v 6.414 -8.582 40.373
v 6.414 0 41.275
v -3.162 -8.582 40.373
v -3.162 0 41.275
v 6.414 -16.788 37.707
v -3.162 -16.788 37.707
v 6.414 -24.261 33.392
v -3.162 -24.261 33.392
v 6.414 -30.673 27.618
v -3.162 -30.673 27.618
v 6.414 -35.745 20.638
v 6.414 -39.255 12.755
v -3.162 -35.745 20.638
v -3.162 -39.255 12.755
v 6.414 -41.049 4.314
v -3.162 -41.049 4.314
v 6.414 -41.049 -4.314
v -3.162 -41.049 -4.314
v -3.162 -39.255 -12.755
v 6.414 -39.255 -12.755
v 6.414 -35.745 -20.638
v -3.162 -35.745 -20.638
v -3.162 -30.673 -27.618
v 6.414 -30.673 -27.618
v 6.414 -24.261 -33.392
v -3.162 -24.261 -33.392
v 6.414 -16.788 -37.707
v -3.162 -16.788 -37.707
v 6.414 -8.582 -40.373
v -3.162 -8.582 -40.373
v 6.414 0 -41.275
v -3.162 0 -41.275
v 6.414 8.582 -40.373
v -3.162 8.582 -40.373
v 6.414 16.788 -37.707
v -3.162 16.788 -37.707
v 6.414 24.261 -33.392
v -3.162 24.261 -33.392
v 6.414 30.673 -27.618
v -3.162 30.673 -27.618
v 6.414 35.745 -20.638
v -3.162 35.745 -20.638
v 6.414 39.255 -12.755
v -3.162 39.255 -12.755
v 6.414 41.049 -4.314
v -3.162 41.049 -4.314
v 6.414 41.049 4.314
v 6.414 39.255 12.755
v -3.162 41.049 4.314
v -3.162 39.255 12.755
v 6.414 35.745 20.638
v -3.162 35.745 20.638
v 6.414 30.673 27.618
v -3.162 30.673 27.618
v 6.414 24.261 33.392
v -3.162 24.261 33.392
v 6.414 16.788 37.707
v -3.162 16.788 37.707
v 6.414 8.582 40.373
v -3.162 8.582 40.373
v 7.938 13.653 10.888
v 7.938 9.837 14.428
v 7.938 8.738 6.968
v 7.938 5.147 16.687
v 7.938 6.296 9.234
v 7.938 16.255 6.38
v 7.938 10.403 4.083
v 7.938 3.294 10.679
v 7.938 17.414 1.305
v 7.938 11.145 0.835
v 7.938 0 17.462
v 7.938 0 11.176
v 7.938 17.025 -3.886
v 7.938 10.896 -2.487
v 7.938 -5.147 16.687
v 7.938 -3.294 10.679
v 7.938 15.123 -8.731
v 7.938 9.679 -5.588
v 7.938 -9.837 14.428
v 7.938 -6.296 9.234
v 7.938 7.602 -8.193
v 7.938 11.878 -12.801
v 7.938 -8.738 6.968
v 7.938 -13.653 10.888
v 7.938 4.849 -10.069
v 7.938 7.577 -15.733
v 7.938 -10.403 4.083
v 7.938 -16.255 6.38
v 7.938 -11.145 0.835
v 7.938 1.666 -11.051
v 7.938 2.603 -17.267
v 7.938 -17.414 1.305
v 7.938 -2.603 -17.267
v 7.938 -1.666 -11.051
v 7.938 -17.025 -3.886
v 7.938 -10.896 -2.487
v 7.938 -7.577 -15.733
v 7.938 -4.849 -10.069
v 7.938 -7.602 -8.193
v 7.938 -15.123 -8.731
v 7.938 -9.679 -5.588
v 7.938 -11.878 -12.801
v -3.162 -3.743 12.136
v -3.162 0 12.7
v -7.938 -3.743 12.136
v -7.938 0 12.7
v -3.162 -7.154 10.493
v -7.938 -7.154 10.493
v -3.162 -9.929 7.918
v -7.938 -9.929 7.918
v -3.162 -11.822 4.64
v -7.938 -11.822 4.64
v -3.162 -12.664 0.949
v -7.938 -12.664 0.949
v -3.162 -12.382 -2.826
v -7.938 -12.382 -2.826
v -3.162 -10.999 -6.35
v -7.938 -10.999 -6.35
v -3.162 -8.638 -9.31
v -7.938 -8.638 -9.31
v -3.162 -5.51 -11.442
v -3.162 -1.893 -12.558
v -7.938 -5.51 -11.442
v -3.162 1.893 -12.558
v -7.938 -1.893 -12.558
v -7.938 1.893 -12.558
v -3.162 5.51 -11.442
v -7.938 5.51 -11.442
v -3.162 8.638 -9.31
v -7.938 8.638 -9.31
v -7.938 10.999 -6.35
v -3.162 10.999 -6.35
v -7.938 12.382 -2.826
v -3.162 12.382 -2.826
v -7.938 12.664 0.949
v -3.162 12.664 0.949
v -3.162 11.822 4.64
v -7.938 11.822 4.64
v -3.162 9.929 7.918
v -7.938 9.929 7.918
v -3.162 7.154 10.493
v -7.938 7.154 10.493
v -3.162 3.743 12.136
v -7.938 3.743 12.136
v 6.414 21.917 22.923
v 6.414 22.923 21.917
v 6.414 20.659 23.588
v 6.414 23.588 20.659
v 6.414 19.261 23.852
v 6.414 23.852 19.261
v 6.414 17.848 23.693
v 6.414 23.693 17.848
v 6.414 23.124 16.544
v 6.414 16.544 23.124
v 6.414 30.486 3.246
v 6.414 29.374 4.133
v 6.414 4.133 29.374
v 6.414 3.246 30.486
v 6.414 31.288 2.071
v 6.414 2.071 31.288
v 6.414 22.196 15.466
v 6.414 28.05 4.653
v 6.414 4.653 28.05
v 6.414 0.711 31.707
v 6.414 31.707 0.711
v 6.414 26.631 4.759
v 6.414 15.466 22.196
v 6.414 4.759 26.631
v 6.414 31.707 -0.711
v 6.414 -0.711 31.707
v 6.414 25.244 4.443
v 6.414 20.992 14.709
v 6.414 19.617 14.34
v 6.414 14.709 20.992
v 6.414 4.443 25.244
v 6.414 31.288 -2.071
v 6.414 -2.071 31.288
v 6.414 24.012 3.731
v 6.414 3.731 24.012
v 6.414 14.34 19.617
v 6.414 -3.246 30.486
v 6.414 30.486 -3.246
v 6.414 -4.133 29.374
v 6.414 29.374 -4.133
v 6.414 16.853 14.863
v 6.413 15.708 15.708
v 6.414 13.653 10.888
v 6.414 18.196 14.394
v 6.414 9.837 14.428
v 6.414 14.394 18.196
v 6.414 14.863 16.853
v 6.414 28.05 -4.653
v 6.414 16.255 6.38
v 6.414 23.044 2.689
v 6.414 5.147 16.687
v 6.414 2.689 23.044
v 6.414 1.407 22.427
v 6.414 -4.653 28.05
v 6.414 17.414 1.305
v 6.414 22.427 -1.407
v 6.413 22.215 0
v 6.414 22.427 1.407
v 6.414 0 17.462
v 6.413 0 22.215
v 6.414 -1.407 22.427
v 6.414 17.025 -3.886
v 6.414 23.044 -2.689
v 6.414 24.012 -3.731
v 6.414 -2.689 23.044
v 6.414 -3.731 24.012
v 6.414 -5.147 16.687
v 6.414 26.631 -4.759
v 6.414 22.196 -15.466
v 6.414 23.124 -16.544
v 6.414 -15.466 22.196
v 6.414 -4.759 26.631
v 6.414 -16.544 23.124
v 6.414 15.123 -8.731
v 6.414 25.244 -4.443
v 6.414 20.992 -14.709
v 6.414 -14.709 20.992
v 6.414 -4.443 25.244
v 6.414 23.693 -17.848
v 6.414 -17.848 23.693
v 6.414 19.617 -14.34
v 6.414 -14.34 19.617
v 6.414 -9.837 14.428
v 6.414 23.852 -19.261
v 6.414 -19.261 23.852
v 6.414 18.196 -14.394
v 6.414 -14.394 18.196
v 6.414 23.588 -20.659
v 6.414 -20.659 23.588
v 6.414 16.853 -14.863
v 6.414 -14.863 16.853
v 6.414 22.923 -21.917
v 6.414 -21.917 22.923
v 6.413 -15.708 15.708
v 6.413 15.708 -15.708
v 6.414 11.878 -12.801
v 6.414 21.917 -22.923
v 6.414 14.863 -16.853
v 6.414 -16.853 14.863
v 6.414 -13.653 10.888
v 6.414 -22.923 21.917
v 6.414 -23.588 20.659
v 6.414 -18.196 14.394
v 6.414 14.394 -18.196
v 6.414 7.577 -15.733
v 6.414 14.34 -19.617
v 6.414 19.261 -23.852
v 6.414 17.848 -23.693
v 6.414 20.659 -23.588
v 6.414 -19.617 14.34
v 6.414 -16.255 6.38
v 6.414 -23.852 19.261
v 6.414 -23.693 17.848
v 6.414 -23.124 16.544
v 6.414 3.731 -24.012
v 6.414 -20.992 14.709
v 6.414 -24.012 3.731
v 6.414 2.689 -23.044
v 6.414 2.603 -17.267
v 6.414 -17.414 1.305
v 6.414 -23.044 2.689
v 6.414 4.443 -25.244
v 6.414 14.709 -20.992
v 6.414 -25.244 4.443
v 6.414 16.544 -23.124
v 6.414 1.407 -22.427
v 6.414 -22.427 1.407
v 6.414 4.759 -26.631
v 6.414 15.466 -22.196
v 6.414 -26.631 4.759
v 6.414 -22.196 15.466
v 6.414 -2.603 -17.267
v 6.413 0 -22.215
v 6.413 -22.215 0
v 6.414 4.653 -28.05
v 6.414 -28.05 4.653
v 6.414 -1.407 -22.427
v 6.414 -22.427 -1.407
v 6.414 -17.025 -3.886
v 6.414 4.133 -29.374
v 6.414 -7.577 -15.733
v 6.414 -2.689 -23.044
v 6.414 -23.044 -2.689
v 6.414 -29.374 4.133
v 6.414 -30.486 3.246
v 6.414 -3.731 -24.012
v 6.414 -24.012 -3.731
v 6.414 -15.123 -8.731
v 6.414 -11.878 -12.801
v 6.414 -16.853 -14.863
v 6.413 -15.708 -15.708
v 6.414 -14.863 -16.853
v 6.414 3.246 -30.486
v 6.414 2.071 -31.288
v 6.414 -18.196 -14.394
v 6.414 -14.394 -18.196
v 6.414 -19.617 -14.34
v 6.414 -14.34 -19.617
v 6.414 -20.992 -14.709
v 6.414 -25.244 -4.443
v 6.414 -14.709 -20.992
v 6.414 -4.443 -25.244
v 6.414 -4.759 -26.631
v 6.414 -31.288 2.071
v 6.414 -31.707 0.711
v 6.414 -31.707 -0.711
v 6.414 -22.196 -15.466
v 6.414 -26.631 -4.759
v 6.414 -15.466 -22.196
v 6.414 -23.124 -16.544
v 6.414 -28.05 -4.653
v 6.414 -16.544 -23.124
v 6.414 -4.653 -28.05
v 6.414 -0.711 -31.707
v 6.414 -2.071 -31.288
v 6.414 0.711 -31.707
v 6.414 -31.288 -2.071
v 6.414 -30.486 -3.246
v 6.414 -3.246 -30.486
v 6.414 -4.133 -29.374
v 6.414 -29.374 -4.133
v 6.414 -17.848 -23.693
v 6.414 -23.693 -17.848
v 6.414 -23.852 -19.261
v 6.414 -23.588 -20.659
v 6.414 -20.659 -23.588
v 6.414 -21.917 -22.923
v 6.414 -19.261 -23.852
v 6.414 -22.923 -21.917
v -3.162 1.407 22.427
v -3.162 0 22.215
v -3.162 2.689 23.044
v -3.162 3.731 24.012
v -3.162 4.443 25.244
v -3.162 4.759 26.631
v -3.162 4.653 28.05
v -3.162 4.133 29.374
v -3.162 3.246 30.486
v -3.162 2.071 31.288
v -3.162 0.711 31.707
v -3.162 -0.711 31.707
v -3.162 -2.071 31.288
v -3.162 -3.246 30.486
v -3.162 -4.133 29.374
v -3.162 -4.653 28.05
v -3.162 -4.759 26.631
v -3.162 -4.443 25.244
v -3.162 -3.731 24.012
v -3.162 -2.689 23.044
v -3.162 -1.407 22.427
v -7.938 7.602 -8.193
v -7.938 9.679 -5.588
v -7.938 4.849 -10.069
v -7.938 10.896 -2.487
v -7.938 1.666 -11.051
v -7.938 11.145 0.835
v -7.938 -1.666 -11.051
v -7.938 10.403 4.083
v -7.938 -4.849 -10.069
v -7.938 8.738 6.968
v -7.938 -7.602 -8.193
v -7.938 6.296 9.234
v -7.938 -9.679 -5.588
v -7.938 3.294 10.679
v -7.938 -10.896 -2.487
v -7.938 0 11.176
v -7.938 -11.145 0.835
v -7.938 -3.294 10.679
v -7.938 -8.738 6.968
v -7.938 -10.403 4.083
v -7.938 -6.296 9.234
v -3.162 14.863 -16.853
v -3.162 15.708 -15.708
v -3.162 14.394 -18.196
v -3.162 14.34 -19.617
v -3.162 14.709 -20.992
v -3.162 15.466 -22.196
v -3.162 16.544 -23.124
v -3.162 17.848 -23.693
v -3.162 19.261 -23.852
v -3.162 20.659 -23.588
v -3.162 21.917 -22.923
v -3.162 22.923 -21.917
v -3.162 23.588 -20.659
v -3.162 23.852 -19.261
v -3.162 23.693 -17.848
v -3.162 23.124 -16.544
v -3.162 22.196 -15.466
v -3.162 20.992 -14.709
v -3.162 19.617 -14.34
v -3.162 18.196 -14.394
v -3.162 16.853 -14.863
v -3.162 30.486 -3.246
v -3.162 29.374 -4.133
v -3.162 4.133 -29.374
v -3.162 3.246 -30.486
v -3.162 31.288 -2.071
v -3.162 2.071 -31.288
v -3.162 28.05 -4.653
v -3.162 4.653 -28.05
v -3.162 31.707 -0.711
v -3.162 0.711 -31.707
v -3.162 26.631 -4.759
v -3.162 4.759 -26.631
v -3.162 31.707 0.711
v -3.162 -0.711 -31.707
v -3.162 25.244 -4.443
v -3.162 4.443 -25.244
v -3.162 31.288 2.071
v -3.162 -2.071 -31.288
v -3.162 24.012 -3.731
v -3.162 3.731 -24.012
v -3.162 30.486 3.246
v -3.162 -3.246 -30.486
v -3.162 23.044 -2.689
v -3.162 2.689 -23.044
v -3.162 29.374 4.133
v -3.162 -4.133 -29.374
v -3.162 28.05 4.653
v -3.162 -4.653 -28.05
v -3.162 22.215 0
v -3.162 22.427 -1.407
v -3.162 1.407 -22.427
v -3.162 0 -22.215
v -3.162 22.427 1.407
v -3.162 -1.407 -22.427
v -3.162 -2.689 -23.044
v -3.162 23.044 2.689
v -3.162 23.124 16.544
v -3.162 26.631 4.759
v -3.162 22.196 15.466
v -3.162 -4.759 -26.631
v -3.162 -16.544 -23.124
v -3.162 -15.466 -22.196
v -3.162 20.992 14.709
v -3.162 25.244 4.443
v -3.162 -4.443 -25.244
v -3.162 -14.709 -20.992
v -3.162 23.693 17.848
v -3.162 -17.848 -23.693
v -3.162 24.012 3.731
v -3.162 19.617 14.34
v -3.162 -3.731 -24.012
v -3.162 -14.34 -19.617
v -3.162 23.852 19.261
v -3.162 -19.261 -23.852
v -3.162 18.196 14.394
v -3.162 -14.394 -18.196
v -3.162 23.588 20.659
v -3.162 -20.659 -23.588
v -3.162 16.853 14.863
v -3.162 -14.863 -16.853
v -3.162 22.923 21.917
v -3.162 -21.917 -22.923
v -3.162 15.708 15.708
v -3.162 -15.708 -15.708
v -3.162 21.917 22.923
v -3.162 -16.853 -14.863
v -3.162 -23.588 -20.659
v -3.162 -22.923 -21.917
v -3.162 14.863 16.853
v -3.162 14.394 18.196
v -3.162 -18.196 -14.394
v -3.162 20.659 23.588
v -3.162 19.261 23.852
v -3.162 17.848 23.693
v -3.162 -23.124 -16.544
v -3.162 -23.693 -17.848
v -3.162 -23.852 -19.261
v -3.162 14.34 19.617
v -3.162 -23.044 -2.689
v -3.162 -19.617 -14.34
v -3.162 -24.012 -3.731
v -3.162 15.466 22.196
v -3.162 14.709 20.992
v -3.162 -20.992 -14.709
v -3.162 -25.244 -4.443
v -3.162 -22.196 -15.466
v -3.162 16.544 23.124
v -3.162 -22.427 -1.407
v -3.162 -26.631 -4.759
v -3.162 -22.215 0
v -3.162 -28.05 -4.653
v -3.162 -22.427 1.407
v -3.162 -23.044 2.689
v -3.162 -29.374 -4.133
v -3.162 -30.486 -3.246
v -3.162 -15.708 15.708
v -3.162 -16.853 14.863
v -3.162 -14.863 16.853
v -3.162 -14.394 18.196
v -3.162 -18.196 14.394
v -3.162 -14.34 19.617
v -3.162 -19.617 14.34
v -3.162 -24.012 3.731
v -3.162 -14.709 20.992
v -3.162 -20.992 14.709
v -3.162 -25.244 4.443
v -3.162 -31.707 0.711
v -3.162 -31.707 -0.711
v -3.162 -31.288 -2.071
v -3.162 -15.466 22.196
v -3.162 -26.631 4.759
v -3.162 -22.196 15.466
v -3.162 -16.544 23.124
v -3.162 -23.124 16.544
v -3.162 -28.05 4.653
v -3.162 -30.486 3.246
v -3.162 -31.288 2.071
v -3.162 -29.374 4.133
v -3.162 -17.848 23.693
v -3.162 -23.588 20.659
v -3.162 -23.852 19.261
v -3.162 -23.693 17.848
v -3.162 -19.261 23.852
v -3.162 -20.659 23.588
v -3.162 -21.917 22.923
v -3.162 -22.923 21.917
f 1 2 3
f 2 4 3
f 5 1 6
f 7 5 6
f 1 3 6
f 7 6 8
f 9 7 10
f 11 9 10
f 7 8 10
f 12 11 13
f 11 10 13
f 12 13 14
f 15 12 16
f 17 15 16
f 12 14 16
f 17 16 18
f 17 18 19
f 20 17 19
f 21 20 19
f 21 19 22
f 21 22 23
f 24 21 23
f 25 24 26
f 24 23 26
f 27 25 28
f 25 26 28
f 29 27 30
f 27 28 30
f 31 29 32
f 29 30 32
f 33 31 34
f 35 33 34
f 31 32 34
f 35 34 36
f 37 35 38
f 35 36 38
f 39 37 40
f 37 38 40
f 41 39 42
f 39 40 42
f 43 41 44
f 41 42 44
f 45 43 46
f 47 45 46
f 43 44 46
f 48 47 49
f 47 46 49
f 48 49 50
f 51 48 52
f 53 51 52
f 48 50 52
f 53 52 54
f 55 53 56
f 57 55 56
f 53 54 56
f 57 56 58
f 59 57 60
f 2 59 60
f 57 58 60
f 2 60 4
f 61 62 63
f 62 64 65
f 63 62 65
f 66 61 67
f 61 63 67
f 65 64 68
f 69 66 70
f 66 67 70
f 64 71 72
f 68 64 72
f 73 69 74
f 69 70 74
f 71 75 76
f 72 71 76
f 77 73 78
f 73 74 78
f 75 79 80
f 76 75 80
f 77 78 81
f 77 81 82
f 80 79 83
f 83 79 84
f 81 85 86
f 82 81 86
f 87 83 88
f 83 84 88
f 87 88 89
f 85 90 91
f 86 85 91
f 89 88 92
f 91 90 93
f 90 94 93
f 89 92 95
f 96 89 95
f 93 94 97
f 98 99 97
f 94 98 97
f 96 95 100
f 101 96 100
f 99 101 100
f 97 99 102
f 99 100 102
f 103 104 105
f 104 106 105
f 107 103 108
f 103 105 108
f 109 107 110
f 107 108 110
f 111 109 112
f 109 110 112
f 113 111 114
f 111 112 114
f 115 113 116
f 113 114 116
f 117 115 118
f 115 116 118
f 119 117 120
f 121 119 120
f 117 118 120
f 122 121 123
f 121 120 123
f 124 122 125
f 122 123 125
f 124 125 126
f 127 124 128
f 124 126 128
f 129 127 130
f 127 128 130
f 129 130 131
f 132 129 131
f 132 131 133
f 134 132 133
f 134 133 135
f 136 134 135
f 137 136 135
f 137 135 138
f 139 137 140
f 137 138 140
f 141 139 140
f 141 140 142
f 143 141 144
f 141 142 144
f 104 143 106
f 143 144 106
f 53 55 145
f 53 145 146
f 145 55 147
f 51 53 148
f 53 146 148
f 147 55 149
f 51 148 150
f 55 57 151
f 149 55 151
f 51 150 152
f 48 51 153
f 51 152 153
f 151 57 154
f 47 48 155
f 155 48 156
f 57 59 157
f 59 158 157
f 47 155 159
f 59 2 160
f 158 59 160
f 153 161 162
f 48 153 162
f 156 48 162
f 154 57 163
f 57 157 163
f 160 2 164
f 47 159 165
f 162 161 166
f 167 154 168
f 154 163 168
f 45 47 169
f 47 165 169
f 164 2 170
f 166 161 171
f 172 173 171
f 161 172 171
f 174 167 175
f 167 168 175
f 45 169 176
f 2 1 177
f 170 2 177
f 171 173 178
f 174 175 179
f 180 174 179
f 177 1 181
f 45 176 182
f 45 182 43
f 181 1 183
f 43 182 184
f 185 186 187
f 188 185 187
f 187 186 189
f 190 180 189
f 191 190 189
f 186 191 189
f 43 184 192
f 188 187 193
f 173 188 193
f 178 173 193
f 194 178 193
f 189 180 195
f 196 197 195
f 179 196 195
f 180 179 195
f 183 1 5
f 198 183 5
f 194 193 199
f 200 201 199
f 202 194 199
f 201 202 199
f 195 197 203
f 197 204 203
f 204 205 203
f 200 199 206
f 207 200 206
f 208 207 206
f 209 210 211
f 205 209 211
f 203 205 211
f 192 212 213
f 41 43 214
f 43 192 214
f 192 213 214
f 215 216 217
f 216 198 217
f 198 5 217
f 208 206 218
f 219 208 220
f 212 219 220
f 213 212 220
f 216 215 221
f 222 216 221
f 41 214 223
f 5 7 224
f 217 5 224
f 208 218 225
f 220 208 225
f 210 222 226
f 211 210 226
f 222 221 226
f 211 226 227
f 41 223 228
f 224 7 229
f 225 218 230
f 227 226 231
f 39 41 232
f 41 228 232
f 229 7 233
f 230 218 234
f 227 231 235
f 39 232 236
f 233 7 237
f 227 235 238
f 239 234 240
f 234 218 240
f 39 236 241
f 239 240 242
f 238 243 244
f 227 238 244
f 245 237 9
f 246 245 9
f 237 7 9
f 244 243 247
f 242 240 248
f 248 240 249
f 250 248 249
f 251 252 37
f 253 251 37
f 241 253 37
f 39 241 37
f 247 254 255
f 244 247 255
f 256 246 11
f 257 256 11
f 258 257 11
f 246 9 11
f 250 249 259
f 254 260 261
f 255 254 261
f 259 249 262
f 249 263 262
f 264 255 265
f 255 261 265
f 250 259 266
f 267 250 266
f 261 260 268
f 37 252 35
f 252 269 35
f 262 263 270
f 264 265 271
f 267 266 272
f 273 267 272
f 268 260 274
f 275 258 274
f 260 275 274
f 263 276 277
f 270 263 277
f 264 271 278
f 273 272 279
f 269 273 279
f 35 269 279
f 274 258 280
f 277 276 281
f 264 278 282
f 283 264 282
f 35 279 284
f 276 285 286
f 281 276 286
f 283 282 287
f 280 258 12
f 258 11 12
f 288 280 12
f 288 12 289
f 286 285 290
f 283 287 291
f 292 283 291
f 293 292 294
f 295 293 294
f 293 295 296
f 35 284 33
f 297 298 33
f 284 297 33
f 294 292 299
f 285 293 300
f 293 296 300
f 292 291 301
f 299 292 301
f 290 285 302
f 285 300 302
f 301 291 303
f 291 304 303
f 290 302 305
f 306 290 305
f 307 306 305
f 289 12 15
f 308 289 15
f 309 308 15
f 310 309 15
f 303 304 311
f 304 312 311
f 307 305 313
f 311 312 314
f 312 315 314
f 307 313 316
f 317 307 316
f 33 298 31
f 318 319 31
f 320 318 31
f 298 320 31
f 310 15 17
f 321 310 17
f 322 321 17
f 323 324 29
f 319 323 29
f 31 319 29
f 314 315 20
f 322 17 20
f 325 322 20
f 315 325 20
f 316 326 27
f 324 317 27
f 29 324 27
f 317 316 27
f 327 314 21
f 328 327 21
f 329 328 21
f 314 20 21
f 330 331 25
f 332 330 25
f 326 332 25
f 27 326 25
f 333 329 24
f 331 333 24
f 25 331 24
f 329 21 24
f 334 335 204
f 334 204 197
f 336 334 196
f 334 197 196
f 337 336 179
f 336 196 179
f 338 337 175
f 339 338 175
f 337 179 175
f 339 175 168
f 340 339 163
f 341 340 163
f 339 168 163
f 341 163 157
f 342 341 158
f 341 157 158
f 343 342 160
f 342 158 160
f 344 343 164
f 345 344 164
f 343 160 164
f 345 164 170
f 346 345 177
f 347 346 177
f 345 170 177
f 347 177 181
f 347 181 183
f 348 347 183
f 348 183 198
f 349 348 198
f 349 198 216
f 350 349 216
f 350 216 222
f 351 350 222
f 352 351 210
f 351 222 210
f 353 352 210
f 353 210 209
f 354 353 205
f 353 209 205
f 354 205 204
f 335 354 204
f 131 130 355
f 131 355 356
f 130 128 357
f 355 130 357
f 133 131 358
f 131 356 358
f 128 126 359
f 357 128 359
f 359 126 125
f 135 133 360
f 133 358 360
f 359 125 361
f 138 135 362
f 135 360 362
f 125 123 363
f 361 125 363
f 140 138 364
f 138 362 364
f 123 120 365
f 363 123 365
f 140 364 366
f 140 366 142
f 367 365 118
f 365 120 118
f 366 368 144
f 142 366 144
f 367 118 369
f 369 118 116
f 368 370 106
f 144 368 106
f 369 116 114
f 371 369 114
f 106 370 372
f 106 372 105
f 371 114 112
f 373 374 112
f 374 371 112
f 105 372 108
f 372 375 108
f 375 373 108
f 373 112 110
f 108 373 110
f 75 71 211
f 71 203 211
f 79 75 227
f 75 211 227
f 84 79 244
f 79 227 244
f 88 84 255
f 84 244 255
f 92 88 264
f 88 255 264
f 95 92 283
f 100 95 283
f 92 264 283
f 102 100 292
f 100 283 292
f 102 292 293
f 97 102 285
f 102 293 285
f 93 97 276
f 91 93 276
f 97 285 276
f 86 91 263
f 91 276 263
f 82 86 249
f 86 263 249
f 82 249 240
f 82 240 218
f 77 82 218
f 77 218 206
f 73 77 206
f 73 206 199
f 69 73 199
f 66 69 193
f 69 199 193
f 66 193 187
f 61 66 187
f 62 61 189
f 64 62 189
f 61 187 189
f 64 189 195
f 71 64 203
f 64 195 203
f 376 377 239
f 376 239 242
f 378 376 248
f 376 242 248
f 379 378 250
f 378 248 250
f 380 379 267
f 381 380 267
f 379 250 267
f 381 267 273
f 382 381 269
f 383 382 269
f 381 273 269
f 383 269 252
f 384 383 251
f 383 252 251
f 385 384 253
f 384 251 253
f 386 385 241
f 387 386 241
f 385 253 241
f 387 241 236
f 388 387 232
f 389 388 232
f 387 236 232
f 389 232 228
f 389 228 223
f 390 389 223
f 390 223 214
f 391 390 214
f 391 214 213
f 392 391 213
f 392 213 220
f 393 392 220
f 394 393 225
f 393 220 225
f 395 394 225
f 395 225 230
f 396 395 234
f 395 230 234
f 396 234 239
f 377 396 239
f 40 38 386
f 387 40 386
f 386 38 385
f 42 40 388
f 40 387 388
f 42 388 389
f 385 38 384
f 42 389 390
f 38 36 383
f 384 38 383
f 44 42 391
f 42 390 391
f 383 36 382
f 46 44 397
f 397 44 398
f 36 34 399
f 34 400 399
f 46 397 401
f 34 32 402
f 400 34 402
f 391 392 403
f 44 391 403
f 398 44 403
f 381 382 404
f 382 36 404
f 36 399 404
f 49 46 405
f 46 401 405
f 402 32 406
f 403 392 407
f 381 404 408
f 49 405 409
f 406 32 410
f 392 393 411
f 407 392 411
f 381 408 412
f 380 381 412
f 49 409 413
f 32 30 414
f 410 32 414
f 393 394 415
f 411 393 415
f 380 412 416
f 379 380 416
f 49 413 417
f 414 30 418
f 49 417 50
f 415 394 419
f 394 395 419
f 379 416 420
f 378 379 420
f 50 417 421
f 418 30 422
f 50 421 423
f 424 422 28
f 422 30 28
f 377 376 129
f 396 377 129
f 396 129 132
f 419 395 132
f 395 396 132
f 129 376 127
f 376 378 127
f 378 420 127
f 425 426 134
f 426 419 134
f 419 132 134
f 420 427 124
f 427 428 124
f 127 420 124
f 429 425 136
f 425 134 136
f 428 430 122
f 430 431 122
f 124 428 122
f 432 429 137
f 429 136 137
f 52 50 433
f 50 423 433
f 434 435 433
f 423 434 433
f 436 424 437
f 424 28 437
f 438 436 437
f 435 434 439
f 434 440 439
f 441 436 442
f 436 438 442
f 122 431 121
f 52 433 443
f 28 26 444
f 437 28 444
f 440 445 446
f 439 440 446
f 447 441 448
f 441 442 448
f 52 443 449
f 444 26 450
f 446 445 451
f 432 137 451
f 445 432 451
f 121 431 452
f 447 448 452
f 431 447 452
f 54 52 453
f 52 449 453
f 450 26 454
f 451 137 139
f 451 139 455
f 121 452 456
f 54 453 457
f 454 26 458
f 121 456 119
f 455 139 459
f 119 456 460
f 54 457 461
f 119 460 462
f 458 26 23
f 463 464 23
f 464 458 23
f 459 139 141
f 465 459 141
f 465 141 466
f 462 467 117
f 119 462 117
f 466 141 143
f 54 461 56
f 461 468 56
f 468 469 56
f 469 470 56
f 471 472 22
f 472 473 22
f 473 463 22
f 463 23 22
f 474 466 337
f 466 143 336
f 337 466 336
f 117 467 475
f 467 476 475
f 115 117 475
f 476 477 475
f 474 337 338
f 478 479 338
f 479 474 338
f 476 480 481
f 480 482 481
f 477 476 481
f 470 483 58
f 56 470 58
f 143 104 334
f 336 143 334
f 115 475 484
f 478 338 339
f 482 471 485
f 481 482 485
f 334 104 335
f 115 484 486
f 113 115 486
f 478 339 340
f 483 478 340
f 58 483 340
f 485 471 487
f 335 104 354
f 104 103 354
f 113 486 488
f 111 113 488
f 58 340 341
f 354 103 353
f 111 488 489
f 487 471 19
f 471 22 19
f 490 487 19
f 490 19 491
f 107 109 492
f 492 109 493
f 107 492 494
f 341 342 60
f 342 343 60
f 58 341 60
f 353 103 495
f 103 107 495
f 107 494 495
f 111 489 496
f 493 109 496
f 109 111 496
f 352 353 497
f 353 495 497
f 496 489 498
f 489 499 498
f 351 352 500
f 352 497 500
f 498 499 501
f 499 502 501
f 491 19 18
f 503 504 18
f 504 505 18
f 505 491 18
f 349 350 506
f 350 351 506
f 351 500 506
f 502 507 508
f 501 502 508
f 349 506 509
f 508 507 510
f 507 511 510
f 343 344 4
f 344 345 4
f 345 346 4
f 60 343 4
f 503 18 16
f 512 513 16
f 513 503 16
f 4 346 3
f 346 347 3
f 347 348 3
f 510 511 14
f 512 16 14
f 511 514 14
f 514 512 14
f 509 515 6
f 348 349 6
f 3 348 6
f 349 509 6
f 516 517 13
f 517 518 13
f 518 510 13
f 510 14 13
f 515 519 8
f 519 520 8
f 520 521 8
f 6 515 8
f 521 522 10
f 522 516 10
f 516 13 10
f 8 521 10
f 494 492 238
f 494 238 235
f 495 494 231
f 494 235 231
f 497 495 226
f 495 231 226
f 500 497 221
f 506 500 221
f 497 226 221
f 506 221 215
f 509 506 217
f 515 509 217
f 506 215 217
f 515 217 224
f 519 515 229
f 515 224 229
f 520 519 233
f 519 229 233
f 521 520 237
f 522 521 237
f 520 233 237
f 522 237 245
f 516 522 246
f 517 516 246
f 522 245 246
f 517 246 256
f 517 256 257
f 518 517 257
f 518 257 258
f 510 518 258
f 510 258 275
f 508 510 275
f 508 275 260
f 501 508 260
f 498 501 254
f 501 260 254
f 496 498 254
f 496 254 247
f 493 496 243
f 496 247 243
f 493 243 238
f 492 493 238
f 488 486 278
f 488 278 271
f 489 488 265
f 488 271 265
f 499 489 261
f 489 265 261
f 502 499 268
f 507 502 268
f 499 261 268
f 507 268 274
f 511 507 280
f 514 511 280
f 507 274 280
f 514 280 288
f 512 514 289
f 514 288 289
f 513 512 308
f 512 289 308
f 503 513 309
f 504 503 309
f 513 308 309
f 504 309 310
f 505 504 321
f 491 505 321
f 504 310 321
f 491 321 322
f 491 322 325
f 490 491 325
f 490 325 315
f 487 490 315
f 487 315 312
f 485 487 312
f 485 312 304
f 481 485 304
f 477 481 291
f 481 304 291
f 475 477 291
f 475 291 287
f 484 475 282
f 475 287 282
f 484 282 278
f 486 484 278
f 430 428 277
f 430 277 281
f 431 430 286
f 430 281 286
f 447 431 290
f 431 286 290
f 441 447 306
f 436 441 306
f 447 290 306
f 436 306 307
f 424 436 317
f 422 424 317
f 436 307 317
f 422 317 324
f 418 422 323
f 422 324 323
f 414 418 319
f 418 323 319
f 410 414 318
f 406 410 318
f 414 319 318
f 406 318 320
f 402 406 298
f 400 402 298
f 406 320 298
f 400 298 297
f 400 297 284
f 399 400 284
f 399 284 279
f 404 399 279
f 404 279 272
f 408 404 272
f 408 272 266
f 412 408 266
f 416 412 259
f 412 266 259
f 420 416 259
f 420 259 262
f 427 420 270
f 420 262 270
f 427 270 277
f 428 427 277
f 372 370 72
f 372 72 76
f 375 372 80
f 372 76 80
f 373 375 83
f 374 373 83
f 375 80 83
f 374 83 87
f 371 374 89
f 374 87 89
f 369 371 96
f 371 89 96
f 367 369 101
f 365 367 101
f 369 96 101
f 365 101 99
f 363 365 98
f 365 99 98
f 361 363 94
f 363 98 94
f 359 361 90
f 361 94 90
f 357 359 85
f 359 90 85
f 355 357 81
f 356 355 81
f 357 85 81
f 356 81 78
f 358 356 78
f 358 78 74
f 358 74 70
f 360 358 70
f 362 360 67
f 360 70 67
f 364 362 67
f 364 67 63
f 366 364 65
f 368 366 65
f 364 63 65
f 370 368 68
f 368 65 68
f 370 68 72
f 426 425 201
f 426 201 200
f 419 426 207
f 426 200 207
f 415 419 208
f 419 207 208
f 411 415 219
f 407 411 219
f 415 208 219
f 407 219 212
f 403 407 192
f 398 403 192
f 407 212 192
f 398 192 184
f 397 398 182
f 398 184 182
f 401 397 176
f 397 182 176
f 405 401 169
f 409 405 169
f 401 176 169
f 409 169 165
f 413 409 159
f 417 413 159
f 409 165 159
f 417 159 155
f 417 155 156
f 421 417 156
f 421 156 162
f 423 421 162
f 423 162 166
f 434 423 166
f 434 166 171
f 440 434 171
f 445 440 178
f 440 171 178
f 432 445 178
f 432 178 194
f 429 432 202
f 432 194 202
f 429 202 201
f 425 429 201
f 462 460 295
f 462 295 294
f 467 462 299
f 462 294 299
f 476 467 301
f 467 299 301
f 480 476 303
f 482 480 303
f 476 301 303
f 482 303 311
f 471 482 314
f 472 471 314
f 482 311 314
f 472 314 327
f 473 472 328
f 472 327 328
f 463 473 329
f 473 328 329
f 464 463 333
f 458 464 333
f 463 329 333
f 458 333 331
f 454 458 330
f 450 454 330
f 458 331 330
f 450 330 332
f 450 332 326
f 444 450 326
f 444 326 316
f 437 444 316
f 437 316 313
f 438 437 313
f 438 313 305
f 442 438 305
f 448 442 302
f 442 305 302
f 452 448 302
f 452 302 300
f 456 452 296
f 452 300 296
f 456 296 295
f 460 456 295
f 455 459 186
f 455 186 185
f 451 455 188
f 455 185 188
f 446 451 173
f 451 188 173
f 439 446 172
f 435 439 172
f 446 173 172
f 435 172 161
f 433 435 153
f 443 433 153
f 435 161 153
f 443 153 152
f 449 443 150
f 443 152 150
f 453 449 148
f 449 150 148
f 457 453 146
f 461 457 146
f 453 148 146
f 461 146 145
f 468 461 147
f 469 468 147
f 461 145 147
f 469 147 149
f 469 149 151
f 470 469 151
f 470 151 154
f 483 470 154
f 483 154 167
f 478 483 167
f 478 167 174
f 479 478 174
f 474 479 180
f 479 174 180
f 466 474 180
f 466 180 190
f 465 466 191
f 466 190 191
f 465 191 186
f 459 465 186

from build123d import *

# Parameters (mm, degrees)
F2_R     = 4.77266
F3_DEPTH = 12.7
F4_COUNT = 8


with BuildPart() as f1:
    # F0 (on Front) → F1 (revolve)
    with BuildSketch(Plane.XZ):
        Polygon((-7.9375, 12.7), (-7.9375, 11.176), (7.9375, 11.176), (7.9375, 17.4625), (6.4135, 17.4625), (6.4135, 41.275), (-3.1623, 41.275), (-3.1623, 12.7), align=None)
    revolve(axis=Axis((0, 0, 0), (1, 0, 0)))

    # F2 (on Right) → F3 (cut, symmetric)
    with BuildSketch(Plane.YZ):
        with Locations((-26.9875, 0)):
            Circle(F2_R)
    f3 = extrude(amount=F3_DEPTH, both=True, mode=Mode.SUBTRACT)

    # F4: F3 ×8 about axis
    f4_axis = Axis((0, 0, 0), (1, 0, 0))
    for i in range(1, F4_COUNT):
        add(f3.rotate(f4_axis, i * 360 / F4_COUNT), mode=Mode.SUBTRACT)


solid = f1.part
